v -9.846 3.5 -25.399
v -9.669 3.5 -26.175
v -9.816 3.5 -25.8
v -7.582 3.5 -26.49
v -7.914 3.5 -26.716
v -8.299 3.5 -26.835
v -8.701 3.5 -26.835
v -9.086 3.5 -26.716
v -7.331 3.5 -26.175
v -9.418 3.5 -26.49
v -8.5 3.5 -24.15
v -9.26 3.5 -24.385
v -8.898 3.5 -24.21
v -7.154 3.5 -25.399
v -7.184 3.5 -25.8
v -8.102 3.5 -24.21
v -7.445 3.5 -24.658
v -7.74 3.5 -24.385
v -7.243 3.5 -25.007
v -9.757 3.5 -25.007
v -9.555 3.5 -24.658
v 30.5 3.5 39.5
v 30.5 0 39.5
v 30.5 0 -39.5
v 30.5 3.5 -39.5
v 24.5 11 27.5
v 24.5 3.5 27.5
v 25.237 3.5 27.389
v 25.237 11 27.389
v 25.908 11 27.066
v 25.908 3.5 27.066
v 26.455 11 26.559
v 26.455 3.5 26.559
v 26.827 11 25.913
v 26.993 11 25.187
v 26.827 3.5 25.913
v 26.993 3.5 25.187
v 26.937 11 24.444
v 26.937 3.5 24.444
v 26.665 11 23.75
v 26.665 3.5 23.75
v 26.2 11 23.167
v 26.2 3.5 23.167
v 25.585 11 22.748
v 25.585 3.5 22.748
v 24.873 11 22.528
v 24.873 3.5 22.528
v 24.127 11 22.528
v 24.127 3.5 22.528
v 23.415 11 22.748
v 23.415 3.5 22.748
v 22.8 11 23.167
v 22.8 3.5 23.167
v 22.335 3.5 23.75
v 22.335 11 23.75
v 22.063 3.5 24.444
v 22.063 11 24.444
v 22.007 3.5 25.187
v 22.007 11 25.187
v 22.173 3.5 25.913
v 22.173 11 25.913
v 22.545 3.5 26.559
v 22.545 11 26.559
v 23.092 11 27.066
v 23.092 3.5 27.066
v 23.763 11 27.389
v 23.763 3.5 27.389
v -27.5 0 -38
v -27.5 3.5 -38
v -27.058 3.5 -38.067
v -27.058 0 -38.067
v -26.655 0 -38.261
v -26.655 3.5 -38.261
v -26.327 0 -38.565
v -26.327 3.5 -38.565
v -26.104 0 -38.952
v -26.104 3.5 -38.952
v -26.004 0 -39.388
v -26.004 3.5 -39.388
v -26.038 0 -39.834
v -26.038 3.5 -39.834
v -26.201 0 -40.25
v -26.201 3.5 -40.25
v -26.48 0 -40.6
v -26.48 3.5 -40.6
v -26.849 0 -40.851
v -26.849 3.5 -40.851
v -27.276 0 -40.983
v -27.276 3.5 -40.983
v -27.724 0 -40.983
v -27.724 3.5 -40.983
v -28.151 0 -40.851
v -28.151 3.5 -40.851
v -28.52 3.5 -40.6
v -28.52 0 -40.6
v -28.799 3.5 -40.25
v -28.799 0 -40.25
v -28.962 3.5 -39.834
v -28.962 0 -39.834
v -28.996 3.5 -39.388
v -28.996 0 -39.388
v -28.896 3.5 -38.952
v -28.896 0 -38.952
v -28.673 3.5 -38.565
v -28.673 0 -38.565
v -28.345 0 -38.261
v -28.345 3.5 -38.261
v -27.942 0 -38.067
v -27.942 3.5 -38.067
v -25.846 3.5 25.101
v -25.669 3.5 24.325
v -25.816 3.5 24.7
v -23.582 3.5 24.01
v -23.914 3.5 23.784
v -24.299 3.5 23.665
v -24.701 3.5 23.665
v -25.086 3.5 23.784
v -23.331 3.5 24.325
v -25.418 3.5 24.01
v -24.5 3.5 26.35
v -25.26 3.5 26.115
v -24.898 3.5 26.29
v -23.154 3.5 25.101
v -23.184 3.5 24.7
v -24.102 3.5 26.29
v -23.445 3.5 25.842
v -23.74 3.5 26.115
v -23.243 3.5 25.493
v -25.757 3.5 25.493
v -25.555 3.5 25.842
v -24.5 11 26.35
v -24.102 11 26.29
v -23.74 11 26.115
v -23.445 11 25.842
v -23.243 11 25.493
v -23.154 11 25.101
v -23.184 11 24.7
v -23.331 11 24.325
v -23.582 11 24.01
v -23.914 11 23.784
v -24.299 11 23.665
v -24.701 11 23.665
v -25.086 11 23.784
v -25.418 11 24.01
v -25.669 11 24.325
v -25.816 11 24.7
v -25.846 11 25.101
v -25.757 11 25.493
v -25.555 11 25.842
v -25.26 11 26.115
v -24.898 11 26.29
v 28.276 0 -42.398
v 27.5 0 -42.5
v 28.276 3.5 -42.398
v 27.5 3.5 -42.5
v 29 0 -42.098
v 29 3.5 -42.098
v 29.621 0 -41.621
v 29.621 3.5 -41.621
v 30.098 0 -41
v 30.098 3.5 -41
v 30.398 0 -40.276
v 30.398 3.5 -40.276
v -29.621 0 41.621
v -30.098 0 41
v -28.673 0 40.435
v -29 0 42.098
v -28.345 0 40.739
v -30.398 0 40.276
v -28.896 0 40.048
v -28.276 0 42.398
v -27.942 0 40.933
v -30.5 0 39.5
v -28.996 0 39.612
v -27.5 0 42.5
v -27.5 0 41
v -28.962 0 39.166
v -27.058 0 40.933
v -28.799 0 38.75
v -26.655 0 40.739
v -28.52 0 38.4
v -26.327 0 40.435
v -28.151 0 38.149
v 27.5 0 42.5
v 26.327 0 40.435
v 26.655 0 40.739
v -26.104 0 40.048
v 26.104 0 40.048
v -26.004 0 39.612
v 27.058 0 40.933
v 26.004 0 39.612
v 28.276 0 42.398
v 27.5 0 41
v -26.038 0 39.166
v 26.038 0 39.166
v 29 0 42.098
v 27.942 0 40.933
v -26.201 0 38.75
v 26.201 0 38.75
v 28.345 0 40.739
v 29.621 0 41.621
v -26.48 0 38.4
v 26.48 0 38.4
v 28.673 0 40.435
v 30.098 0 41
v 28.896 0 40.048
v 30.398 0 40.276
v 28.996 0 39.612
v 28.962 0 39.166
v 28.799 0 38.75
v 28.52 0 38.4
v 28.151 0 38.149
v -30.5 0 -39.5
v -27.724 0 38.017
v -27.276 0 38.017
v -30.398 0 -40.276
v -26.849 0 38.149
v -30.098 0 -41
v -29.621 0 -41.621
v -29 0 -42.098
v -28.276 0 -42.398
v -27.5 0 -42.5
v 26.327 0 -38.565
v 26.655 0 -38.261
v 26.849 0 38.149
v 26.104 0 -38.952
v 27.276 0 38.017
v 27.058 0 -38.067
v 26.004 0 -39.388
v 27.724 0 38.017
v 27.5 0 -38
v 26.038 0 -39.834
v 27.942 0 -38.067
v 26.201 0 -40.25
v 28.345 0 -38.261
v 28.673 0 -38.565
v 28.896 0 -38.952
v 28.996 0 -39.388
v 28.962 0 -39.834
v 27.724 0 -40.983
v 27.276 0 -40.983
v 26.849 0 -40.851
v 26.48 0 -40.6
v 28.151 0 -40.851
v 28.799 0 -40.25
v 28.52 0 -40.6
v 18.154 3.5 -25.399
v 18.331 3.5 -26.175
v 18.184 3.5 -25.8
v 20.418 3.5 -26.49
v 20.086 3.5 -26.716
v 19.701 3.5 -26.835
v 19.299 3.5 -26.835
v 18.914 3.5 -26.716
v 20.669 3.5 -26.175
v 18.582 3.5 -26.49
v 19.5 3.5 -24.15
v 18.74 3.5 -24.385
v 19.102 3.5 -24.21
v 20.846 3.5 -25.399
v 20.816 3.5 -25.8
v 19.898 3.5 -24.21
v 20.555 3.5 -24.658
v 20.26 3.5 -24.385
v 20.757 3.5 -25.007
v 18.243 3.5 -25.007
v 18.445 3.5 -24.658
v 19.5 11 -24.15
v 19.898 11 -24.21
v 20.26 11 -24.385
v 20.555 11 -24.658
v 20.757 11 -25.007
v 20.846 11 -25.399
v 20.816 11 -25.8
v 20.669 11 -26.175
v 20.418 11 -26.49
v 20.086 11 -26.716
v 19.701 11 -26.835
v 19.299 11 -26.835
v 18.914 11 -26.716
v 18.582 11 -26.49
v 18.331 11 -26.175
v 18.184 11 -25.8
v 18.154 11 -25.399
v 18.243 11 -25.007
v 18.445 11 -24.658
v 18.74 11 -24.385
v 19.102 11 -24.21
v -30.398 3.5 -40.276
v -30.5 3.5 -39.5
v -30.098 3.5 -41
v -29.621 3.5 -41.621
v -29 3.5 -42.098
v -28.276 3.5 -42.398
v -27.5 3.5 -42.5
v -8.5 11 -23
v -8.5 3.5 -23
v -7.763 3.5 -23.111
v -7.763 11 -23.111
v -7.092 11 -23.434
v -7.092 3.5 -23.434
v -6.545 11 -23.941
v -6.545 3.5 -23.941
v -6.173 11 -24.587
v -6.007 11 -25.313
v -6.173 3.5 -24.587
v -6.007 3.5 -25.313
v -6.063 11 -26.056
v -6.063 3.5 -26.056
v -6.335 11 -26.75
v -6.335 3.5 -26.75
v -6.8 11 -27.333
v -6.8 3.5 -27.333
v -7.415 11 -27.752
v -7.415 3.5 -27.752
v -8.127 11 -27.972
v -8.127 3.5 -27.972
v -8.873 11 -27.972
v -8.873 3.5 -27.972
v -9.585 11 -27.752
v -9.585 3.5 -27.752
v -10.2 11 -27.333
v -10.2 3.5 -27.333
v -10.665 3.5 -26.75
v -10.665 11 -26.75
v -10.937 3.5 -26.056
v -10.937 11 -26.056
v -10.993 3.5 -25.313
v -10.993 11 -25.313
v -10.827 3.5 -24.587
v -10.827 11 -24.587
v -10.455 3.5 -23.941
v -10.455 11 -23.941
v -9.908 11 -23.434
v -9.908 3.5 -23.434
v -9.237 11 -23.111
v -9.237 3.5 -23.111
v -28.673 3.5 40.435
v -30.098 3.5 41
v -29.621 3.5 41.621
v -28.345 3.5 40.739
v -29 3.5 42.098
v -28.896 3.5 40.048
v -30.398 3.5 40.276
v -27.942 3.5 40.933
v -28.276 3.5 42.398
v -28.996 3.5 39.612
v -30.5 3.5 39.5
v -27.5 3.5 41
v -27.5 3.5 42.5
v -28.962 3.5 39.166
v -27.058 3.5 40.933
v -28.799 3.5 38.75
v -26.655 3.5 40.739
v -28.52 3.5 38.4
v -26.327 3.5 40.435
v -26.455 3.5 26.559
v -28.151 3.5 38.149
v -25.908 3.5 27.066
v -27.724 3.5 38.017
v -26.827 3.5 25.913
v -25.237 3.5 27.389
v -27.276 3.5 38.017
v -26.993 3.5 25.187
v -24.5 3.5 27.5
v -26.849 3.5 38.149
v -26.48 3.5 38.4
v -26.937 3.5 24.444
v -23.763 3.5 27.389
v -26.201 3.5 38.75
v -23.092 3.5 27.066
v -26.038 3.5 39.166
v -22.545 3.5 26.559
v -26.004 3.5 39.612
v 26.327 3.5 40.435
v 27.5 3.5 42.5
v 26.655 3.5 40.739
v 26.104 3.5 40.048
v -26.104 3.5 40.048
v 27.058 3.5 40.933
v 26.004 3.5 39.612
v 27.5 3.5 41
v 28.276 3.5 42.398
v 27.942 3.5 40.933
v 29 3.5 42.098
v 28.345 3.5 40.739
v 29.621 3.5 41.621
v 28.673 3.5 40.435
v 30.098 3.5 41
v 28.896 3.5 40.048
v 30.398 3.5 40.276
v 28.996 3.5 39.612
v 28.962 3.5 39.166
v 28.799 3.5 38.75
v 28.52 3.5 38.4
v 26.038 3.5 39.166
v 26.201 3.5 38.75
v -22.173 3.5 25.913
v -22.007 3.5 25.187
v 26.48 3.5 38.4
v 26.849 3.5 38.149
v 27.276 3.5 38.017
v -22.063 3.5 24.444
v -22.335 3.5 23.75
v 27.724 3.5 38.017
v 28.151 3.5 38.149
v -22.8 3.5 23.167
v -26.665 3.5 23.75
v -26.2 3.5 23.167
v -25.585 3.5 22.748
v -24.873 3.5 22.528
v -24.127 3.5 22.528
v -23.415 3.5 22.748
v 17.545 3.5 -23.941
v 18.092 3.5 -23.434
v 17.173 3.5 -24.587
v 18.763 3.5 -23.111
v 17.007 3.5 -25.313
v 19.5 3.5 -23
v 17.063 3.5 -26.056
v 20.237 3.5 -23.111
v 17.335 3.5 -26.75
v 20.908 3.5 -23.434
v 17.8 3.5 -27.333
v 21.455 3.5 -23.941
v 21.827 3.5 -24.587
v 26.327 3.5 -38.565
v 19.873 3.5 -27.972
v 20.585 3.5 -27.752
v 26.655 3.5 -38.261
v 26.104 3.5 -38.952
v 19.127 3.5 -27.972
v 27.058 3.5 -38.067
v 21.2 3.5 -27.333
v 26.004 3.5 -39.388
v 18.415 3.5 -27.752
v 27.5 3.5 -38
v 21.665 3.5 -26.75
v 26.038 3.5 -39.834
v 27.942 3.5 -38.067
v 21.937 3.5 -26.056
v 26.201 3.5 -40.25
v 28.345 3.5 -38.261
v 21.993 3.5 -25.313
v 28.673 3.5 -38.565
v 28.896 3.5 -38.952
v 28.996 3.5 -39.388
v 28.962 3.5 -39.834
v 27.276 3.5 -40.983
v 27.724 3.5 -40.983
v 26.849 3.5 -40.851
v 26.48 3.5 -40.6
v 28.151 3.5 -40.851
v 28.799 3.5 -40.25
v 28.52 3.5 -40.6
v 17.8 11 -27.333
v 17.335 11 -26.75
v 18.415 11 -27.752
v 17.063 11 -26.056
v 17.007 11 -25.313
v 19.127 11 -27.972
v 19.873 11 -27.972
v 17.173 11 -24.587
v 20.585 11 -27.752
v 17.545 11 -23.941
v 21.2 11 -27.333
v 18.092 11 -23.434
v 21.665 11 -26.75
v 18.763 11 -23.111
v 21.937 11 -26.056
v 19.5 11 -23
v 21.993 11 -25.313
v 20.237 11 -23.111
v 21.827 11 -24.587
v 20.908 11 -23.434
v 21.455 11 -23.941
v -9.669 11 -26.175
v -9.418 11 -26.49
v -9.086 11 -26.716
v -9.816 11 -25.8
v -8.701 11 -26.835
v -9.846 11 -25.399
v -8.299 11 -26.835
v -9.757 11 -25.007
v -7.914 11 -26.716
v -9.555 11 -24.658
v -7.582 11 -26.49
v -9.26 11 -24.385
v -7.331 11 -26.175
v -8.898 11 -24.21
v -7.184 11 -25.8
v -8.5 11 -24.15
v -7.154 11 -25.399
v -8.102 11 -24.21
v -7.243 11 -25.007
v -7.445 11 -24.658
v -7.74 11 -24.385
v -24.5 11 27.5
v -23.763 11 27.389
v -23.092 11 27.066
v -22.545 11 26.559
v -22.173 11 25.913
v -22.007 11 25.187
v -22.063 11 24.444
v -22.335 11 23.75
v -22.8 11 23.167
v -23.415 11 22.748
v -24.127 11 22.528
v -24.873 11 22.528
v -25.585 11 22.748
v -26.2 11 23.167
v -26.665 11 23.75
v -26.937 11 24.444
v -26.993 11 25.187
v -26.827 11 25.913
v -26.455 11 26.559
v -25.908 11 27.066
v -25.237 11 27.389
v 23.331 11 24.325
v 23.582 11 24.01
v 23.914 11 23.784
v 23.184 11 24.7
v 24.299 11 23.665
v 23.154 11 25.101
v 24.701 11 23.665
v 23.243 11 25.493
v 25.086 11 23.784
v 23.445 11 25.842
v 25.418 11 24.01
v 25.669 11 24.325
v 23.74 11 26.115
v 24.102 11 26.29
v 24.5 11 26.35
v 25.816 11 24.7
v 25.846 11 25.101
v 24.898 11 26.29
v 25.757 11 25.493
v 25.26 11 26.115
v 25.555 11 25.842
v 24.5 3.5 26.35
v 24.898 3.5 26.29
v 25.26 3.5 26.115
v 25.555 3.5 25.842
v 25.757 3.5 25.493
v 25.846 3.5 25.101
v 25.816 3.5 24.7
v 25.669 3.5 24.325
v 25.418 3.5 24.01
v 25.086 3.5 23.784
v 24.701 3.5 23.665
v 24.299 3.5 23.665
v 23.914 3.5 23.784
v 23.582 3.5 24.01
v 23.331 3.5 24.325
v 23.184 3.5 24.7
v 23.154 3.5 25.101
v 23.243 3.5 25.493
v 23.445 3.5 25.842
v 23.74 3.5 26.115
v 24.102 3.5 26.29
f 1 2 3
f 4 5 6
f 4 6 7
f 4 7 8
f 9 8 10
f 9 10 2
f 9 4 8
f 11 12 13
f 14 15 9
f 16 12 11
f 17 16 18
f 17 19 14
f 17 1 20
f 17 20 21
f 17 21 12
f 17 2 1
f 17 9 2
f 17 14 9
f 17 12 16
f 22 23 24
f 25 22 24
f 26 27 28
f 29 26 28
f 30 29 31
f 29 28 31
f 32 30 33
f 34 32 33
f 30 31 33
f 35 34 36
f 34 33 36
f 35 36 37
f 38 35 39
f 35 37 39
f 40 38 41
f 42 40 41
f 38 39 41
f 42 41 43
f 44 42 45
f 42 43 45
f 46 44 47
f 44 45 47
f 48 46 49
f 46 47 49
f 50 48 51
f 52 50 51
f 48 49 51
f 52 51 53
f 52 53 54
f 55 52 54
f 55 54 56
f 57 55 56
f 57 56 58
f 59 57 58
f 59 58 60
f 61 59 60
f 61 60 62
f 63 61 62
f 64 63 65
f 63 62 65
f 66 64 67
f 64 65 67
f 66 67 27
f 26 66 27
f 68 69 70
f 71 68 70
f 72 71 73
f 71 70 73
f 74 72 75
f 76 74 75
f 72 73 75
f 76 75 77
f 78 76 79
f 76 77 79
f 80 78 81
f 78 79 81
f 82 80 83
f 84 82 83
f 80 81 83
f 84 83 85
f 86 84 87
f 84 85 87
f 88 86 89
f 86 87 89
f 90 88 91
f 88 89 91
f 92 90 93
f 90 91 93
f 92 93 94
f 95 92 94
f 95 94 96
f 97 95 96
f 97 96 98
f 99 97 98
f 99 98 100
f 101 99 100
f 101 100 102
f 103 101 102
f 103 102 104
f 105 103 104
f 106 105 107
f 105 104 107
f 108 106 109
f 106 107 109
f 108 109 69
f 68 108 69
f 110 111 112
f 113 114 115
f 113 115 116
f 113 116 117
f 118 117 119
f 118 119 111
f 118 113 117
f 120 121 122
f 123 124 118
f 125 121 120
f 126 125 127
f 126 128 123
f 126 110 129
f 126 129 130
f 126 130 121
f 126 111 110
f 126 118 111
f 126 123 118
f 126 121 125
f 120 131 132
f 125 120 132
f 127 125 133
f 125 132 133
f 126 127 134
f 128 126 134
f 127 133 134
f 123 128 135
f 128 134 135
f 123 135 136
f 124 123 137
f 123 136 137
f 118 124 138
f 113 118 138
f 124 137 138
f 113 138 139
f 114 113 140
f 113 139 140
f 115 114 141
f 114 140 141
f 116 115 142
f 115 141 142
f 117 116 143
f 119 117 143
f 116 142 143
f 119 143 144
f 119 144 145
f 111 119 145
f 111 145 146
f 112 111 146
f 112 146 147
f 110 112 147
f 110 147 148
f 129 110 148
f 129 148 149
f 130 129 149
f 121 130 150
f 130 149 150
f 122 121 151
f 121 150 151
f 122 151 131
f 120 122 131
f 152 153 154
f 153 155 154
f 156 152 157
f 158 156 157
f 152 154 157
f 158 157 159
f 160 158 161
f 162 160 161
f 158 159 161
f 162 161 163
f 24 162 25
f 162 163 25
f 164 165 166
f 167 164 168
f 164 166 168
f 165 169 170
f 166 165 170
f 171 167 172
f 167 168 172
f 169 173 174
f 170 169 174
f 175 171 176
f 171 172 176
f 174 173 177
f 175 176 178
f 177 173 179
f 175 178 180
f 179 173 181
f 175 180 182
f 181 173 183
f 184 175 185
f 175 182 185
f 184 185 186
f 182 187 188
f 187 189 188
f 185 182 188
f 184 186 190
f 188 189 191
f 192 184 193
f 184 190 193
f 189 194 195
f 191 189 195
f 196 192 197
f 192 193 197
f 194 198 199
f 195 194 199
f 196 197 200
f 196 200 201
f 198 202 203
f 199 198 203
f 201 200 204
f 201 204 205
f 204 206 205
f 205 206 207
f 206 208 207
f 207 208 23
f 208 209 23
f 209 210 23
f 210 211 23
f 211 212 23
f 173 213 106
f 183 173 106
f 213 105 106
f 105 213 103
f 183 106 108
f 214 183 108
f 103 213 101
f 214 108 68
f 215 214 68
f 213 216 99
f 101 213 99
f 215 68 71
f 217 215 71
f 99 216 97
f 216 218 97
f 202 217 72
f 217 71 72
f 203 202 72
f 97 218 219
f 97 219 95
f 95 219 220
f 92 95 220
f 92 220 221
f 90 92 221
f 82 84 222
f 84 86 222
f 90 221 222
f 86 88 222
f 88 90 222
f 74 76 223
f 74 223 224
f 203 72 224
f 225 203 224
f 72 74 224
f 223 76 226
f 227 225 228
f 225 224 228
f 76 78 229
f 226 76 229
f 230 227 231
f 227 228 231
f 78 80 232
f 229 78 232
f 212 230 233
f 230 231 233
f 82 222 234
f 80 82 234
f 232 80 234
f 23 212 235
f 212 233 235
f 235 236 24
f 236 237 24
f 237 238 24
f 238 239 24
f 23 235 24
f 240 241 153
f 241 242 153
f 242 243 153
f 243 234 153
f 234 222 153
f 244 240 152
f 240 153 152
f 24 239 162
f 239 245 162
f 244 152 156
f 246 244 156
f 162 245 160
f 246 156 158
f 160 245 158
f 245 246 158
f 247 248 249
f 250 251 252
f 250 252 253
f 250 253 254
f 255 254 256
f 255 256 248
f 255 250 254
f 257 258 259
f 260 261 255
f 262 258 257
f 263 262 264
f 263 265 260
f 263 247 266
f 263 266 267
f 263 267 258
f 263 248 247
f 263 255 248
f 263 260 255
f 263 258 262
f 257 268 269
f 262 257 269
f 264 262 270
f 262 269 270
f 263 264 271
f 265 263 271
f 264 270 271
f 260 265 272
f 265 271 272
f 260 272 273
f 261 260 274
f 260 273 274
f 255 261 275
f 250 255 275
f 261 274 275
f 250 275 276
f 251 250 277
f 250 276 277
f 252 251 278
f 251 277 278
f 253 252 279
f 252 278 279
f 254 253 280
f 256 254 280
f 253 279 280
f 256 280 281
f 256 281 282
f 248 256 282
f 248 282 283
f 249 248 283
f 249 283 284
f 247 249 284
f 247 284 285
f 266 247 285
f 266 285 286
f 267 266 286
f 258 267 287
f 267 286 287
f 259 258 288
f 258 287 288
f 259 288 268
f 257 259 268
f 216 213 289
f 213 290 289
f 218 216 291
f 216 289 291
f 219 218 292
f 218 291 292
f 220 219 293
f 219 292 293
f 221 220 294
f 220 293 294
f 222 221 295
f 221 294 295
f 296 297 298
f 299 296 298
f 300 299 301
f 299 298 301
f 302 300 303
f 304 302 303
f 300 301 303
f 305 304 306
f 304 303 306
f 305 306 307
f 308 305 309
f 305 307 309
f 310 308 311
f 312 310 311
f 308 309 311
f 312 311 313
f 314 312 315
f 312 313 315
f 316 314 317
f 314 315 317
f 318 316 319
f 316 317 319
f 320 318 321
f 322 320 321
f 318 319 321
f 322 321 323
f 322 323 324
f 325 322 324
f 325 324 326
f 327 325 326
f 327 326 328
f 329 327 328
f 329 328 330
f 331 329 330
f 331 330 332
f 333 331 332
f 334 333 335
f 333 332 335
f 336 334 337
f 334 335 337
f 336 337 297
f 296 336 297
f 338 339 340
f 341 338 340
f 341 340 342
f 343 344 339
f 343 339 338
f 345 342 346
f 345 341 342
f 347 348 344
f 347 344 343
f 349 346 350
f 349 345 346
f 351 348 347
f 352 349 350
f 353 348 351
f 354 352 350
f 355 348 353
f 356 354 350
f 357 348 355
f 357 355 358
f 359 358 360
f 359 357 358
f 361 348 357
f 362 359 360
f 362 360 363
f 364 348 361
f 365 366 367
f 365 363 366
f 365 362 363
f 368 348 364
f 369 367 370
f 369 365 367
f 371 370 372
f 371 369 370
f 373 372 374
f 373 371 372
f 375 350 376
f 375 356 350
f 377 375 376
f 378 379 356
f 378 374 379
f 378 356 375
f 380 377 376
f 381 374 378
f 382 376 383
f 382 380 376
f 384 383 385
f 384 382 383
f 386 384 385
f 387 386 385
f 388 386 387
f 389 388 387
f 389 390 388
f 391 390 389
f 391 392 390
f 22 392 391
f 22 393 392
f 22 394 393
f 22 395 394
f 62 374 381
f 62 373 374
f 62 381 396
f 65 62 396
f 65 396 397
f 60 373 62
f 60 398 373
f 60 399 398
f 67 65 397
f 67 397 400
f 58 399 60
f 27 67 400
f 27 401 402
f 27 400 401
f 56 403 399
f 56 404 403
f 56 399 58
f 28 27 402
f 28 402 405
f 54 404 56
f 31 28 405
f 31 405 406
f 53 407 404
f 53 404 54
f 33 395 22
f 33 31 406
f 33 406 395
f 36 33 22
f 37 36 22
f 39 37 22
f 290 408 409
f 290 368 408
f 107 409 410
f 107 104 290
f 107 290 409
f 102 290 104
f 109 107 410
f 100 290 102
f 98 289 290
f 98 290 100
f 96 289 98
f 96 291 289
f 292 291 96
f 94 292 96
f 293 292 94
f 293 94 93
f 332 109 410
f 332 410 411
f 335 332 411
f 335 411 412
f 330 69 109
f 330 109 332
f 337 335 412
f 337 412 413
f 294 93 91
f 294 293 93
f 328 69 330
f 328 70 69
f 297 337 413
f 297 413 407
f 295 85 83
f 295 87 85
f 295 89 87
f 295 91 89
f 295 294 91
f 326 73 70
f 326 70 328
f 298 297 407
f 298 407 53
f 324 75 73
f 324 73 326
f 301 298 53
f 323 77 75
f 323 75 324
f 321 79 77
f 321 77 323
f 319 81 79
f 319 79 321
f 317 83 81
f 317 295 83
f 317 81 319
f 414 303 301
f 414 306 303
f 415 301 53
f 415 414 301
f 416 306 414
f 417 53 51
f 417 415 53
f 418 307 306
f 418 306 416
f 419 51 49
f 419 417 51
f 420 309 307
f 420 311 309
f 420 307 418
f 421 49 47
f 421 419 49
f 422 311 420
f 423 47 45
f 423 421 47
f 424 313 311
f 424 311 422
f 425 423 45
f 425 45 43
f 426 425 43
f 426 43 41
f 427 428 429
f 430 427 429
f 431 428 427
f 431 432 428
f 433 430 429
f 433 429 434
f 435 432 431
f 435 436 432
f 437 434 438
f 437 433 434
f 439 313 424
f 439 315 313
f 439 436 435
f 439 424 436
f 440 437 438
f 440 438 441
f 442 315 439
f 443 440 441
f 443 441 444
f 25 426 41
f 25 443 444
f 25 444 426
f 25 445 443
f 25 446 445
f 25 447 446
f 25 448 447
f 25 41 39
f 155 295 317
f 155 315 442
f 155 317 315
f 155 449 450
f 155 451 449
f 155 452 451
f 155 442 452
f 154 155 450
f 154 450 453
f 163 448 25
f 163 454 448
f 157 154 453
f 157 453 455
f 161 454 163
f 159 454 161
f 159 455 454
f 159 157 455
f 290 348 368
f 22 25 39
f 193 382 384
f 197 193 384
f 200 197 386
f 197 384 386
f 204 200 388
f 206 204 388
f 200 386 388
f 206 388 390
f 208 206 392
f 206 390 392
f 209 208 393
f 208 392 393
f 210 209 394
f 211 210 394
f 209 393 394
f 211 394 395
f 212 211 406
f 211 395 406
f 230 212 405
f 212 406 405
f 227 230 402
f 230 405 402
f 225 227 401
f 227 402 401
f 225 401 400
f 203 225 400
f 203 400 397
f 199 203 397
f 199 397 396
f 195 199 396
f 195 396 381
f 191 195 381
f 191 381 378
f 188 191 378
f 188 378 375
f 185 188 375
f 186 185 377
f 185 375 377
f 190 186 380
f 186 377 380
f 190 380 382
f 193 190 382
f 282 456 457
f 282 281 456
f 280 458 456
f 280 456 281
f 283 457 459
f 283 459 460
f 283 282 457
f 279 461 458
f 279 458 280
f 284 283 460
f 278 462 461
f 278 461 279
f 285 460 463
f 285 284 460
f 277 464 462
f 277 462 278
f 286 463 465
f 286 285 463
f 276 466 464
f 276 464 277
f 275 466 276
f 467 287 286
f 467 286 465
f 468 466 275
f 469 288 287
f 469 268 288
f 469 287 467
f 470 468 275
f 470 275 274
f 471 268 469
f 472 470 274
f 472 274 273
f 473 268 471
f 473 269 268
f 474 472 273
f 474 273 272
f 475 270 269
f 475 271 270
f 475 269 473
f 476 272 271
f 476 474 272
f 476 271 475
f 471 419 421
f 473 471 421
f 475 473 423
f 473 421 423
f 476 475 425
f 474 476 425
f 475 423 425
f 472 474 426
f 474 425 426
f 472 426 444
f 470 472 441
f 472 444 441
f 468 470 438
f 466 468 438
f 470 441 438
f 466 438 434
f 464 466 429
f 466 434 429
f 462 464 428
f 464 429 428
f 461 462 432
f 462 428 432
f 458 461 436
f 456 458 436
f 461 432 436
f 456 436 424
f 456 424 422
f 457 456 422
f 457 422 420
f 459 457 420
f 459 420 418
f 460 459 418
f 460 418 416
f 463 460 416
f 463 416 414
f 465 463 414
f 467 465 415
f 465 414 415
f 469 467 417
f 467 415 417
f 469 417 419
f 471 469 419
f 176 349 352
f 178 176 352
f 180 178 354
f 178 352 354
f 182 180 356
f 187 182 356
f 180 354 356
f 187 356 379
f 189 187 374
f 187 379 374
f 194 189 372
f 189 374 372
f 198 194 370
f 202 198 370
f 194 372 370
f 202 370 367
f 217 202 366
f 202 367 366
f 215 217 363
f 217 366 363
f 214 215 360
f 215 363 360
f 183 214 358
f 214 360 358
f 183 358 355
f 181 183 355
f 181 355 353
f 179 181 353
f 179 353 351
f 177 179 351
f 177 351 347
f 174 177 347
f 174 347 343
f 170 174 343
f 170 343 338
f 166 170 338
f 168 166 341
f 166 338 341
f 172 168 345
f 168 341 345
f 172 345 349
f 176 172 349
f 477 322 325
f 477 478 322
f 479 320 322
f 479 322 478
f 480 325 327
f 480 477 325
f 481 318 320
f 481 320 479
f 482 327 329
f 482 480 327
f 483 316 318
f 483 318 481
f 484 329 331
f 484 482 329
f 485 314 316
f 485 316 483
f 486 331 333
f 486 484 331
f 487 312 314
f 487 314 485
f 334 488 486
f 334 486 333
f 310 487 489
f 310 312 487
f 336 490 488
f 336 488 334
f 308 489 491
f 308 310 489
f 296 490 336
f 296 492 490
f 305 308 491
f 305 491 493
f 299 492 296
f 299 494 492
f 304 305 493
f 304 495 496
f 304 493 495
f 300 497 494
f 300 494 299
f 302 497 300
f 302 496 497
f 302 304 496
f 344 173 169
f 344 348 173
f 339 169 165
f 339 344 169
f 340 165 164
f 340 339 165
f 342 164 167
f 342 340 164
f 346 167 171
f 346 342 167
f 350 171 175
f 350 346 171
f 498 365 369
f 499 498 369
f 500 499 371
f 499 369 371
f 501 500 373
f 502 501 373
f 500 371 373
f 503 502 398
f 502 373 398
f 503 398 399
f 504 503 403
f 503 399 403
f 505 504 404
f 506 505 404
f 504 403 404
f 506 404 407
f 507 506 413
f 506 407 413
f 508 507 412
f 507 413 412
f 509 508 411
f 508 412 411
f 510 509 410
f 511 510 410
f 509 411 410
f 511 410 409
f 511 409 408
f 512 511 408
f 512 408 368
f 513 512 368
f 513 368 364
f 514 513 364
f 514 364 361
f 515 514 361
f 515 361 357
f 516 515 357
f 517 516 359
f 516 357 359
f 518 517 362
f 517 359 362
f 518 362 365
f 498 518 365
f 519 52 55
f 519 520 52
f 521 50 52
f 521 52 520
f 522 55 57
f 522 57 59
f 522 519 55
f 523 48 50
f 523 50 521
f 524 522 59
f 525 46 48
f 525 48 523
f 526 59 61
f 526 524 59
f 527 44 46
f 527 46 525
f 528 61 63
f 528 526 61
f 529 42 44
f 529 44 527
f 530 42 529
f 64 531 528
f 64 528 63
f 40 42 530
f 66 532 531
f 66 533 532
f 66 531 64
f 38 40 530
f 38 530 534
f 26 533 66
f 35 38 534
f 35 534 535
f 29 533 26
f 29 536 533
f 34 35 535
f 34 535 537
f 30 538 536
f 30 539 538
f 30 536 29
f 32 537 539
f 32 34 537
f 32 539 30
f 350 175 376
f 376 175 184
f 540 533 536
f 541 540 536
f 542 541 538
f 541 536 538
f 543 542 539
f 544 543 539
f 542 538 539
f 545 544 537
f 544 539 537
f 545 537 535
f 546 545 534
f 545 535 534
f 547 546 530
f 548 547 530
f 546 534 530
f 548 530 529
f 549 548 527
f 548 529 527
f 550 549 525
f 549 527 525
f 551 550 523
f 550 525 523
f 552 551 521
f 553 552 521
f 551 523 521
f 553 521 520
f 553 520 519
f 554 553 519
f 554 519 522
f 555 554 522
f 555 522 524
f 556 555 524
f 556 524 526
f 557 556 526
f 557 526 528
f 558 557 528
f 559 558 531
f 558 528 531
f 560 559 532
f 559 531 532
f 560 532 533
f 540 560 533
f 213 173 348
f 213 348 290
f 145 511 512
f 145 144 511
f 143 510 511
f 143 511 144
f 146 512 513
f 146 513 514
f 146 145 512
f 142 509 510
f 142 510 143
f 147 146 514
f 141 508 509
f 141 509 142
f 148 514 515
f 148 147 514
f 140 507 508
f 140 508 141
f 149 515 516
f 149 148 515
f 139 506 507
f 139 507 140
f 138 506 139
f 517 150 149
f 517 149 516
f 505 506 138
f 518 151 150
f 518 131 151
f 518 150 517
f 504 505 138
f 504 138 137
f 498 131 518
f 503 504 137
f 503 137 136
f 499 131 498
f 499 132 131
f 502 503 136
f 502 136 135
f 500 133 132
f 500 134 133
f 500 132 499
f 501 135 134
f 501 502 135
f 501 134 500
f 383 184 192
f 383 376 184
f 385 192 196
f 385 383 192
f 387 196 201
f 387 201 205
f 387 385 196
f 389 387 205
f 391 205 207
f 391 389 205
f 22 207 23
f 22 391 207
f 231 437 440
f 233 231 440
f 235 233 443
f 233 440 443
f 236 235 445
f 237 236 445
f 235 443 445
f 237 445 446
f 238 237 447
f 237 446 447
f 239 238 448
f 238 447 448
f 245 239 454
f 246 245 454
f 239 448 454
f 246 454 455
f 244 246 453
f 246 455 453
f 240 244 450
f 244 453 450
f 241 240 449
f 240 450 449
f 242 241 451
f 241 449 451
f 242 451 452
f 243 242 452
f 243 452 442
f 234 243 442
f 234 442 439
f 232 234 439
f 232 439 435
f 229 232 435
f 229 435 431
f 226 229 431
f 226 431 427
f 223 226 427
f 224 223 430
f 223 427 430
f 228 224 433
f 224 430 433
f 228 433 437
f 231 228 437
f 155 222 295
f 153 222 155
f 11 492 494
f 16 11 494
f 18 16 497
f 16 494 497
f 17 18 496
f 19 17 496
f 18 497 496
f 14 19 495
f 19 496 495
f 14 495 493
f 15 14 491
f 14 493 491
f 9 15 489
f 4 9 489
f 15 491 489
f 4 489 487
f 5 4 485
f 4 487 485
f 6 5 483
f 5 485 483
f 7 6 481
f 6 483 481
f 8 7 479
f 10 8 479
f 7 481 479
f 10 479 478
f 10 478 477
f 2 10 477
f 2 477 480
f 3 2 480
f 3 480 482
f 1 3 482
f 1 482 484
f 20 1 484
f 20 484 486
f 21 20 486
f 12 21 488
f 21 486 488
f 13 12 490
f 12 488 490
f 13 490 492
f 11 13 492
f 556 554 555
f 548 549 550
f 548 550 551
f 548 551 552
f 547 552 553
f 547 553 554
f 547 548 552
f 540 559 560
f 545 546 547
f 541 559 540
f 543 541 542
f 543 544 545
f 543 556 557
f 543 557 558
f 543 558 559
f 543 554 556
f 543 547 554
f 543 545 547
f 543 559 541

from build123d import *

# Parameters (mm, degrees)
SKETCH1_W           = 61
SKETCH1_H           = 85
BOSS_EXTRUDE1_DEPTH = 3.5
SKETCH2_R           = 1.5
CUT_EXTRUDE1_DEPTH  = 3.5
SKETCH3_R           = 2.5
BOSS_EXTRUDE2_DEPTH = 7.5
SKETCH4_R           = 1.35
CUT_EXTRUDE2_DEPTH  = 7.5
FILLET1_R           = 3


with BuildPart() as part:
    # Sketch1 → Boss-Extrude1 (new body)
    with BuildSketch(Plane(origin=(0, 0, 0), x_dir=(1, 0, 0), z_dir=(0, 1, 0))):
        Rectangle(SKETCH1_W, SKETCH1_H)
    extrude(amount=BOSS_EXTRUDE1_DEPTH)

    # Sketch2 → Cut-Extrude1 (cut)
    with BuildSketch(Plane(origin=(0, 3.5, 0), x_dir=(1, 0, 0), z_dir=(0, 1, 0))):
        with Locations(Location((-27.5, 39.5, 0), (0, 0, 270))):
            Circle(SKETCH2_R)
        with Locations(Location((27.5, 39.5, 0), (0, 0, 270))):
            Circle(SKETCH2_R)
        with Locations(Location((-27.5, -39.5, 0), (0, 0, 270))):
            Circle(SKETCH2_R)
        with Locations(Location((27.5, -39.5, 0), (0, 0, 270))):
            Circle(SKETCH2_R)
    extrude(amount=-CUT_EXTRUDE1_DEPTH, mode=Mode.SUBTRACT)

    # Sketch3 → Boss-Extrude2 (add)
    with BuildSketch(Plane(origin=(0, 3.5, 0), x_dir=(1, 0, 0), z_dir=(0, 1, 0))):
        with Locations(Location((-24.5, -25, 0), (0, 0, 270))):
            Circle(SKETCH3_R)
        with Locations(Location((24.5, -25, 0), (0, 0, 270))):
            Circle(SKETCH3_R)
        with Locations(Location((19.5, 25.5, 0), (0, 0, 270))):
            Circle(SKETCH3_R)
        with Locations(Location((-8.5, 25.5, 0), (0, 0, 270))):
            Circle(SKETCH3_R)
    extrude(amount=BOSS_EXTRUDE2_DEPTH)

    # Sketch4 → Cut-Extrude2 (cut)
    with BuildSketch(Plane(origin=(0, 11, 0), x_dir=(1, 0, 0), z_dir=(0, 1, 0))):
        with Locations(Location((-8.5, 25.5, 0), (0, 0, 270))):
            Circle(SKETCH4_R)
        with Locations(Location((19.5, 25.5, 0), (0, 0, 270))):
            Circle(SKETCH4_R)
        with Locations(Location((-24.5, -25, 0), (0, 0, 270))):
            Circle(SKETCH4_R)
        with Locations(Location((24.5, -25, 0), (0, 0, 270))):
            Circle(SKETCH4_R)
    extrude(amount=-CUT_EXTRUDE2_DEPTH, mode=Mode.SUBTRACT)

    # Fillet1
    fillet1_edges = [part.edges().sort_by_distance(p)[0] for p in [
        (30.5, 1.75, 42.5),
        (-30.5, 1.75, 42.5),
        (-30.5, 1.75, -42.5),
        (30.5, 1.75, -42.5),
    ]]
    fillet(fillet1_edges, radius=FILLET1_R)


solid = part.part
